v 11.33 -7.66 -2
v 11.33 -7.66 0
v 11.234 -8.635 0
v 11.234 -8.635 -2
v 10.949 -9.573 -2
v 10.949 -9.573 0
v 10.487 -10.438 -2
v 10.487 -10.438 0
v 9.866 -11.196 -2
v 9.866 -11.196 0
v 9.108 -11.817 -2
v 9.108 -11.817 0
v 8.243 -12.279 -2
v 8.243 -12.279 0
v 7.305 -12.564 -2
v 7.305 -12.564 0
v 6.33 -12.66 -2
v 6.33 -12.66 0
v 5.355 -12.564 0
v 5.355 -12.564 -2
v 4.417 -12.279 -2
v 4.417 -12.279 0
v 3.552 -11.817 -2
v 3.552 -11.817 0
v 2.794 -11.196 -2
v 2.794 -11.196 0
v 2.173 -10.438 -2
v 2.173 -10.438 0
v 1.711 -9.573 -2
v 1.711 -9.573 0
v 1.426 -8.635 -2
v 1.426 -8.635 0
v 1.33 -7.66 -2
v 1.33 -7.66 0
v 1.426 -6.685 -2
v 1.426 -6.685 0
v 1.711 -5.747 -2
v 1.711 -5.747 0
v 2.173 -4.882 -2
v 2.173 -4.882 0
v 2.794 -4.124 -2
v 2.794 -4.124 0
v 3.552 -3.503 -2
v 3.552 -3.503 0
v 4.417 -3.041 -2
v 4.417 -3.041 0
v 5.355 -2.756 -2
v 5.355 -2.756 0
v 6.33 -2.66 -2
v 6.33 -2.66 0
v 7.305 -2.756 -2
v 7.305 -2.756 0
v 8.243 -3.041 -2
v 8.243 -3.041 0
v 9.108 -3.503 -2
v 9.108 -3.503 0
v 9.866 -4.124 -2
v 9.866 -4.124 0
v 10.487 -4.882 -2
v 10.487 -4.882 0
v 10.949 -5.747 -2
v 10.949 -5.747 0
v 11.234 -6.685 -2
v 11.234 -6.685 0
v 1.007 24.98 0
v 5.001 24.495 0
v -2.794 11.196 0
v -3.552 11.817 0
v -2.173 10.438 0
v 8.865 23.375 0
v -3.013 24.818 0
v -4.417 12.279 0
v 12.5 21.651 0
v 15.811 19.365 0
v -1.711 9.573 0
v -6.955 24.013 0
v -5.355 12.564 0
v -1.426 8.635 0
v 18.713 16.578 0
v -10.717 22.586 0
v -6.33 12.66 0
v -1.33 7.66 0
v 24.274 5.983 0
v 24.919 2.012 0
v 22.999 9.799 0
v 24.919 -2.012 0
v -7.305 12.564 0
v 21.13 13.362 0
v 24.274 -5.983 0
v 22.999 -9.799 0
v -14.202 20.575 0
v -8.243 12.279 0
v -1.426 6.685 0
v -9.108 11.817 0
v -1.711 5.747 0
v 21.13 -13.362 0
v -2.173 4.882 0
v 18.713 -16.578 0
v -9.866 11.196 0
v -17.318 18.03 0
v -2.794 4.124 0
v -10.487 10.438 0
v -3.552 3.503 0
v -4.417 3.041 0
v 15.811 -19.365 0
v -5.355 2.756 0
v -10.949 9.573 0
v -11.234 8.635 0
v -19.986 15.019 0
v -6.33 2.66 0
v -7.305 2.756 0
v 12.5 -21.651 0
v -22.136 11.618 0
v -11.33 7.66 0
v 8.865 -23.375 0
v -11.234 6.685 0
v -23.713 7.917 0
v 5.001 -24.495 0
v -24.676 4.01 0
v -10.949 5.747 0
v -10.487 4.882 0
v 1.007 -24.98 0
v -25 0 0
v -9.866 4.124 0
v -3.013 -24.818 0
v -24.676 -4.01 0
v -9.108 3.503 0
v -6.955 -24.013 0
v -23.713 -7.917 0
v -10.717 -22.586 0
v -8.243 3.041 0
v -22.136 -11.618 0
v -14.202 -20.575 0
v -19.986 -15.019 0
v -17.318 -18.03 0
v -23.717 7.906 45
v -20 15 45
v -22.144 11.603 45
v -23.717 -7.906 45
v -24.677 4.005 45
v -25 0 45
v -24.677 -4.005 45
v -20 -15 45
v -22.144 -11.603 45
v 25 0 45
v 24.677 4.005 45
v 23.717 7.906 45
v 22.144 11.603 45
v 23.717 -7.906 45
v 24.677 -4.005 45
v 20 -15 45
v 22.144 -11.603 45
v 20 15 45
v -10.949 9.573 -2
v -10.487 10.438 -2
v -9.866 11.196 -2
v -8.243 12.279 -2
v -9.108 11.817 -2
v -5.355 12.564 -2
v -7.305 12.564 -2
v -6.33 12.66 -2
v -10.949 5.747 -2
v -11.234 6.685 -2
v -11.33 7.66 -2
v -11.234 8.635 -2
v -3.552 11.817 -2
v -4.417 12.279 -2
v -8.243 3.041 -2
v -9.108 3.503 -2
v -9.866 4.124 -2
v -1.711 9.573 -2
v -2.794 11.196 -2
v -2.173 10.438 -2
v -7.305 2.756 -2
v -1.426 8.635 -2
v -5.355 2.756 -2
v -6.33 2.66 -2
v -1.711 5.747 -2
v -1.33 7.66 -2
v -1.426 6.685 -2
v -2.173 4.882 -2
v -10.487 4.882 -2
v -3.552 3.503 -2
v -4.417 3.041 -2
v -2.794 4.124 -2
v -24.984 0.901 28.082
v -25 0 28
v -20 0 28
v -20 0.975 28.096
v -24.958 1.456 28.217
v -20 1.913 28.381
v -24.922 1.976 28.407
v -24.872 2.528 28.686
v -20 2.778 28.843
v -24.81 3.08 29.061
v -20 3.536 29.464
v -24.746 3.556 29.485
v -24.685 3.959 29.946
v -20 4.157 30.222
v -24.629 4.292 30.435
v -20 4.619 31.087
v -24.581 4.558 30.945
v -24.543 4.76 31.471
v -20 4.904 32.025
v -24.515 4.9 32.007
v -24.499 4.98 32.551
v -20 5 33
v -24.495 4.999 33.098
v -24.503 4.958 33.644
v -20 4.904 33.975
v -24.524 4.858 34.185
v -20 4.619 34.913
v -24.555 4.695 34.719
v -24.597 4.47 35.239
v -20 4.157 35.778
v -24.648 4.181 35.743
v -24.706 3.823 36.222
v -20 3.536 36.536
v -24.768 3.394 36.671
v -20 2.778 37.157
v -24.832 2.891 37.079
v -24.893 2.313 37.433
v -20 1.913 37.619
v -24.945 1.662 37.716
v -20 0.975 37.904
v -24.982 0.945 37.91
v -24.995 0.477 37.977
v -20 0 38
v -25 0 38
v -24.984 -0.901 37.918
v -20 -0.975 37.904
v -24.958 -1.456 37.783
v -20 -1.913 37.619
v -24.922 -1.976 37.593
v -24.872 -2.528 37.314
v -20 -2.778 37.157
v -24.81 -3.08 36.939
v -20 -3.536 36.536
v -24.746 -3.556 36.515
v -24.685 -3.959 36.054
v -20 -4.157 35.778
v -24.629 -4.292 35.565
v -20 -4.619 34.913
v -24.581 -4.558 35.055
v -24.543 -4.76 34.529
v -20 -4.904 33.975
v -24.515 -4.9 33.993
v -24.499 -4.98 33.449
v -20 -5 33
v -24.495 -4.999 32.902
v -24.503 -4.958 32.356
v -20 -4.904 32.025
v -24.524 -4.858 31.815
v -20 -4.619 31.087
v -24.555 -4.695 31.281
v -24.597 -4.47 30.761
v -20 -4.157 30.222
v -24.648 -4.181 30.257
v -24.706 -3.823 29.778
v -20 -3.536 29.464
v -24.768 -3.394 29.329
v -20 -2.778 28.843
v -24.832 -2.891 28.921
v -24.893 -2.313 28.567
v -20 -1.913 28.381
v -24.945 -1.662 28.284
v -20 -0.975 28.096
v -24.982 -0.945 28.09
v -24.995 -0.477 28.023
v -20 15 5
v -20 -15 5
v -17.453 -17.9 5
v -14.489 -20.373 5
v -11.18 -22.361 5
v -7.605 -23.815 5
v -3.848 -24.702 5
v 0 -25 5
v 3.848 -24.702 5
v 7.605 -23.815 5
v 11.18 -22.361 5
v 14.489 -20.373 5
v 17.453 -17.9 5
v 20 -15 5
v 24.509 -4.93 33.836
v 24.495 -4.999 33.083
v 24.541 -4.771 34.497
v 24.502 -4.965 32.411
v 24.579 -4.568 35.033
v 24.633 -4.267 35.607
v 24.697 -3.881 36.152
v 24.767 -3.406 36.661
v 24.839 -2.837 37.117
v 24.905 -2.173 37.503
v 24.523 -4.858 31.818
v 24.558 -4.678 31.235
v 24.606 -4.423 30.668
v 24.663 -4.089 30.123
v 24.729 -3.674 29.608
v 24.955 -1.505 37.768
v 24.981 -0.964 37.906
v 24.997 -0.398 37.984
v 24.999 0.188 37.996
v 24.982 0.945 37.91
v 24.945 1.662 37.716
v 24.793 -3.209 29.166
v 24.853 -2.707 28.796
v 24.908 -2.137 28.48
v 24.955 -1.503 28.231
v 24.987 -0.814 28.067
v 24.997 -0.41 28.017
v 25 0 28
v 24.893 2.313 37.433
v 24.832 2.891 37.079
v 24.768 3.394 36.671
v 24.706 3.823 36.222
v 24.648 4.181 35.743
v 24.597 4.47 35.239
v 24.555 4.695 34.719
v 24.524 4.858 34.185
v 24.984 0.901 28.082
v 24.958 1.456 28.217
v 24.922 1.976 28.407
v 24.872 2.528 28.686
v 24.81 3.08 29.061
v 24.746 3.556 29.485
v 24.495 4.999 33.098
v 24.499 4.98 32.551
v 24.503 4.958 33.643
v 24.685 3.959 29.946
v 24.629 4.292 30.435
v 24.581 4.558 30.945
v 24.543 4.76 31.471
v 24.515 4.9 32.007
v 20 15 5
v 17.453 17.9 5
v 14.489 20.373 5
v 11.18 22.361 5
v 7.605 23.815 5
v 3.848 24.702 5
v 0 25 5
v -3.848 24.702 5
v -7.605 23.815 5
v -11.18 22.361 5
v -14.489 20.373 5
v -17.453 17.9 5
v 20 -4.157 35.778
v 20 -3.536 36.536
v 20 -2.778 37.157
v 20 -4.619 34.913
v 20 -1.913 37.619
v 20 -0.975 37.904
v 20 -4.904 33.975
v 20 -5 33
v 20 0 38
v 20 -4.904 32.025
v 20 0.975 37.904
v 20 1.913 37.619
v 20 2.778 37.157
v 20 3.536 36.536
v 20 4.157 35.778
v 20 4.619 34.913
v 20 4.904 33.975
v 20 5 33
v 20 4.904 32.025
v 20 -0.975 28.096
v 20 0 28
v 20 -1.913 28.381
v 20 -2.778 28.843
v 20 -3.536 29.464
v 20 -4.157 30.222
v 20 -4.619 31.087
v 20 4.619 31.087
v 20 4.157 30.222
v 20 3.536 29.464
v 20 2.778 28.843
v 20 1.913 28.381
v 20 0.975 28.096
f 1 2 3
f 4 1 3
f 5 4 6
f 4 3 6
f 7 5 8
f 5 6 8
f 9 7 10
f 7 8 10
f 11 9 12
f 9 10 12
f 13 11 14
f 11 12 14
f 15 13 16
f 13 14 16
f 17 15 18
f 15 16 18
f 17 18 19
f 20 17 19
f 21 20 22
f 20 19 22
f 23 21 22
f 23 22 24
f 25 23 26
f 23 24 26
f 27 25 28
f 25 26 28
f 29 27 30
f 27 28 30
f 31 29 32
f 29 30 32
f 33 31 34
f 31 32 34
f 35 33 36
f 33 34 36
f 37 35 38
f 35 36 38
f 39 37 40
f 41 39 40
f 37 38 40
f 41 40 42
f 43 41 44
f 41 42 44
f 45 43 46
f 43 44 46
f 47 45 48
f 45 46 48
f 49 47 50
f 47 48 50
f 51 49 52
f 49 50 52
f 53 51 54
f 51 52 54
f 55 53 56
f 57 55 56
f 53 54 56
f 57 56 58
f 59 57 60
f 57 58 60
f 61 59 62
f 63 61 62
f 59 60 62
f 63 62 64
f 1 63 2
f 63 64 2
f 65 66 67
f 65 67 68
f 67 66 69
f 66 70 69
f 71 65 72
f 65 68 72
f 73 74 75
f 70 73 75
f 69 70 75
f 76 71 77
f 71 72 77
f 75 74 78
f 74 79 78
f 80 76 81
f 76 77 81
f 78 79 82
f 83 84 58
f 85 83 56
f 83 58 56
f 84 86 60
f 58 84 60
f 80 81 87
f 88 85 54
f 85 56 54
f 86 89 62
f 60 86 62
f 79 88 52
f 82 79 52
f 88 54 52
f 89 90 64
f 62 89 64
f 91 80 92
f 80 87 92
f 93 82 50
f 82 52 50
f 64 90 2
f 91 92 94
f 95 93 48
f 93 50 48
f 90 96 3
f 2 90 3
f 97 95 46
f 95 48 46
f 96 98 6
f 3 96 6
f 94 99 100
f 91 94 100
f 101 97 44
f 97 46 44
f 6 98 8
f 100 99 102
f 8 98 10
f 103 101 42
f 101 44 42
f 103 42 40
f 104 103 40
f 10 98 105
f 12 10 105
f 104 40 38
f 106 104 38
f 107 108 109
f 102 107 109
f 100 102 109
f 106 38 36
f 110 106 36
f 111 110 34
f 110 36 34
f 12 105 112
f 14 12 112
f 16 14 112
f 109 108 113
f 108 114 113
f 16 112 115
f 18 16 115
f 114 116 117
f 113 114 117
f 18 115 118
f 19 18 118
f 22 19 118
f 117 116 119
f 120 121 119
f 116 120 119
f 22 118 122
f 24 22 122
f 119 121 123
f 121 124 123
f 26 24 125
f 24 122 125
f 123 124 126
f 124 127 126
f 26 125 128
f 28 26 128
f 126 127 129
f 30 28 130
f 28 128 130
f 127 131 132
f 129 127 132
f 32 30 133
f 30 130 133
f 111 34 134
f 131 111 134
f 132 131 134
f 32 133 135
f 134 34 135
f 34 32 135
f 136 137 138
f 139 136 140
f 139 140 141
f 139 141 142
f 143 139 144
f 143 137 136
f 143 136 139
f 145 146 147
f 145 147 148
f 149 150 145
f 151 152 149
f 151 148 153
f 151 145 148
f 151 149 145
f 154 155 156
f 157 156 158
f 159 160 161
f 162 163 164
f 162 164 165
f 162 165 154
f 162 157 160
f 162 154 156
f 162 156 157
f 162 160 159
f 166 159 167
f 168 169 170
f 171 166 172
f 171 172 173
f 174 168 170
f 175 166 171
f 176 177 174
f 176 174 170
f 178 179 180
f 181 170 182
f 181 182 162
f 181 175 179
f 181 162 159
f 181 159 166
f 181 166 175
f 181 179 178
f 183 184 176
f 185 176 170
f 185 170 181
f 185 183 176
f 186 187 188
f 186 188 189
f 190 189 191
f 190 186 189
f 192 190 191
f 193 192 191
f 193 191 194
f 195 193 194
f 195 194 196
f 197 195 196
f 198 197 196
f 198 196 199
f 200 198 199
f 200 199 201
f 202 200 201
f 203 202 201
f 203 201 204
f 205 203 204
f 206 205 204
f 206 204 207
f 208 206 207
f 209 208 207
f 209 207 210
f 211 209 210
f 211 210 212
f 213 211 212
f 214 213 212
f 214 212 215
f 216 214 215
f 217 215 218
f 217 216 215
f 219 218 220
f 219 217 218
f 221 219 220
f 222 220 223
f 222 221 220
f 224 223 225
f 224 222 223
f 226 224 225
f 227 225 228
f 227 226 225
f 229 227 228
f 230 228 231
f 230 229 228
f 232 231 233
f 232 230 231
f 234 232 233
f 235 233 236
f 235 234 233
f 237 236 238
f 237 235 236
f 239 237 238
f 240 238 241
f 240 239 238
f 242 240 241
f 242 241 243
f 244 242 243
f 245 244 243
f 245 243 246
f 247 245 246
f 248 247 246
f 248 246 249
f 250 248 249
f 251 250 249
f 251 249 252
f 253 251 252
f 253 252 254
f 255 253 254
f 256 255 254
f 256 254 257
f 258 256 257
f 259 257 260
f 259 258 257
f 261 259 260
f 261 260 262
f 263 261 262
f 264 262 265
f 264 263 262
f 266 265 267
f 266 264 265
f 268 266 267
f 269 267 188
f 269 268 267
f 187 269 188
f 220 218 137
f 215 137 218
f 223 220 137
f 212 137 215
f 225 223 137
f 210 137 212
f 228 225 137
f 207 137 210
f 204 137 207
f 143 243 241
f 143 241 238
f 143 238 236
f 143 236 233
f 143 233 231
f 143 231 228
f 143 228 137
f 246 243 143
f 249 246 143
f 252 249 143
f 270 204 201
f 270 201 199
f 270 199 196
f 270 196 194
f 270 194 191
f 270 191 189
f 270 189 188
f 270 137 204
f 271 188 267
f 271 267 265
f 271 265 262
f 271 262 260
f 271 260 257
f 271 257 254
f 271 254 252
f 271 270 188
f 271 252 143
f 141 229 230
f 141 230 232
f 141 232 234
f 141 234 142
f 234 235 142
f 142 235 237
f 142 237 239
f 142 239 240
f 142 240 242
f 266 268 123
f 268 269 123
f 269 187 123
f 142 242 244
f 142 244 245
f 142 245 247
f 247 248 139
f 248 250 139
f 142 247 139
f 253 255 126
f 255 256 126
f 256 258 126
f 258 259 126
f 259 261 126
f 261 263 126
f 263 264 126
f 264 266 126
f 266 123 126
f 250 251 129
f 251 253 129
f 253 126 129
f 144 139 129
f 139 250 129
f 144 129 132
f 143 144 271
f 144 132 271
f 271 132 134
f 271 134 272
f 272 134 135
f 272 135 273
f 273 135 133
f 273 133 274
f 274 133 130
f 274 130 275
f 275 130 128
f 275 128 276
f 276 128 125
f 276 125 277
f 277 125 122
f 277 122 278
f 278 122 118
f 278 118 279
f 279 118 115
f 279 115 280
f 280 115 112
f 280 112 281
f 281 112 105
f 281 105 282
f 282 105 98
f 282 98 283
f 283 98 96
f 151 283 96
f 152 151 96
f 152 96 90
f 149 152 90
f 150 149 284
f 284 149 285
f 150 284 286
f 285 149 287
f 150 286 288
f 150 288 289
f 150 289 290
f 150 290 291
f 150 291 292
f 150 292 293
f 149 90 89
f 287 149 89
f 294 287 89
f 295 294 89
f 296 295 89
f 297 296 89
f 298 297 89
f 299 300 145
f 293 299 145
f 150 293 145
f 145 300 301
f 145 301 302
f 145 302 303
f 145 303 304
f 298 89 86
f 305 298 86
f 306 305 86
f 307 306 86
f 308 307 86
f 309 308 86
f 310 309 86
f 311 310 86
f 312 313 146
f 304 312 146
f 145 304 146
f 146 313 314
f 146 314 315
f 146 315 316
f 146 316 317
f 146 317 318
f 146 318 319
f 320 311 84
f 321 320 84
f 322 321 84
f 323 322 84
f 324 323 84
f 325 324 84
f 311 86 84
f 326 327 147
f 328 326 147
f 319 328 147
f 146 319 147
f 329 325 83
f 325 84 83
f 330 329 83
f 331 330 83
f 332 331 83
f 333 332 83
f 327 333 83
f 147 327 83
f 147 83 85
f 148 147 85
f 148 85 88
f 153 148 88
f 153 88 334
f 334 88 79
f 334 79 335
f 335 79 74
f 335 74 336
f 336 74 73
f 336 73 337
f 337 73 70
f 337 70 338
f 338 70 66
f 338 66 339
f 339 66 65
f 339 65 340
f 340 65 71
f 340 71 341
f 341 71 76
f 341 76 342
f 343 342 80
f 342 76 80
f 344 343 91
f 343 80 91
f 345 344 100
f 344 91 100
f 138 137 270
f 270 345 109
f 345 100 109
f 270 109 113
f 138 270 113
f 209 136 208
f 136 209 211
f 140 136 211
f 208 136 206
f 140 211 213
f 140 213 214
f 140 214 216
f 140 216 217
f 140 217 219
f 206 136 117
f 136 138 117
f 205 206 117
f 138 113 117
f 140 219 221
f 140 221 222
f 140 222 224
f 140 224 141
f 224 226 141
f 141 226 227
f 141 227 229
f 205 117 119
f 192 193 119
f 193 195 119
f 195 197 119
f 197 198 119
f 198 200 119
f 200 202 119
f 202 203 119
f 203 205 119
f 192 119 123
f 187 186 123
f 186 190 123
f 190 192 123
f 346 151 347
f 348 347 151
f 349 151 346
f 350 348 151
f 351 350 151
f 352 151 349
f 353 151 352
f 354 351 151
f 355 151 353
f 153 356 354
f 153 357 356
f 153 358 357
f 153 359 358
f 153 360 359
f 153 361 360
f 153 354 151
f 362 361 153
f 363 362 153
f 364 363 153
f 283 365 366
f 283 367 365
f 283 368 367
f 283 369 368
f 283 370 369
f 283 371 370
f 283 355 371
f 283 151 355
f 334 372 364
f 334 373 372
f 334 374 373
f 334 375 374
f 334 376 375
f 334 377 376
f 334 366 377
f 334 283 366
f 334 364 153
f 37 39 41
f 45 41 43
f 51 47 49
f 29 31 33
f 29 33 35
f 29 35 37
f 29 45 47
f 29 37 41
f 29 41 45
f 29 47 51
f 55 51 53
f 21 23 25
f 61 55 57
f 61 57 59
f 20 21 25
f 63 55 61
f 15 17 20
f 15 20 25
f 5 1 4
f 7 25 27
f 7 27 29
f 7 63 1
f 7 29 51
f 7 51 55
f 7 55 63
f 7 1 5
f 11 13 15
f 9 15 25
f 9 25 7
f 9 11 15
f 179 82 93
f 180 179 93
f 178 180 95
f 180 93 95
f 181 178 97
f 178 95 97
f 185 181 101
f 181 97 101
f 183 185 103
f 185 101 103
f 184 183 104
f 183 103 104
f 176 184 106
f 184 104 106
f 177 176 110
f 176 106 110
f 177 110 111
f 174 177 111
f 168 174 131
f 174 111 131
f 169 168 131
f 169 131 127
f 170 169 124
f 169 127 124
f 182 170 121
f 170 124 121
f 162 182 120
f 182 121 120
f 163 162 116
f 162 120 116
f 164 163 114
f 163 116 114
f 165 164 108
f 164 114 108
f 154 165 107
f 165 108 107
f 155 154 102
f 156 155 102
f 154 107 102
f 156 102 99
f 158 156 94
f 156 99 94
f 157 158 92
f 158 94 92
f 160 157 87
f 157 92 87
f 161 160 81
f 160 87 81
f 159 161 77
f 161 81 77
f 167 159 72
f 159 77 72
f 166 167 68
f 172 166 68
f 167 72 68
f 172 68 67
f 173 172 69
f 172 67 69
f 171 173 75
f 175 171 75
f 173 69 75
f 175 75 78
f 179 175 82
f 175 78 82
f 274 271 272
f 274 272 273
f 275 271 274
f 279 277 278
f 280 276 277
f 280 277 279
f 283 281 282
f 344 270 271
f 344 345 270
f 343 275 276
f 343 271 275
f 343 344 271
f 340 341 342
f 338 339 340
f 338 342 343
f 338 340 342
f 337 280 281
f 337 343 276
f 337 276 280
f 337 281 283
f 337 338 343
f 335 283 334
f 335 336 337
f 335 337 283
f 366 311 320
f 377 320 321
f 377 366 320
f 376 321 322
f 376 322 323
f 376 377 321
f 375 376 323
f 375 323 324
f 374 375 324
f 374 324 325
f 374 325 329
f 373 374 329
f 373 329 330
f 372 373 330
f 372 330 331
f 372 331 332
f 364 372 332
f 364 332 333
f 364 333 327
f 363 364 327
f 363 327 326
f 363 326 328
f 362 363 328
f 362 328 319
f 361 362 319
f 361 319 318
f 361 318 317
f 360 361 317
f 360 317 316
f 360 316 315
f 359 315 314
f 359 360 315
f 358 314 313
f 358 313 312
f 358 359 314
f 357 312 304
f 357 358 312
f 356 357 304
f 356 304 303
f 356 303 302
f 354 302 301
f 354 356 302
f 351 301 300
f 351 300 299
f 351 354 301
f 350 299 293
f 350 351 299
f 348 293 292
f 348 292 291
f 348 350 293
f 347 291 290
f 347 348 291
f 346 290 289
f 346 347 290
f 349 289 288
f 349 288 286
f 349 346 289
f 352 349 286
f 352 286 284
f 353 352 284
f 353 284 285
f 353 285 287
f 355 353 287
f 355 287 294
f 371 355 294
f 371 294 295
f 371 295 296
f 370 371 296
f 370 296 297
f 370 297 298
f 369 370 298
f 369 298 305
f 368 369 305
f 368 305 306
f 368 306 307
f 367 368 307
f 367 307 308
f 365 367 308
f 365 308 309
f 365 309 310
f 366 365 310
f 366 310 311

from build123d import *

# Parameters (mm, degrees)
SKETCH1_R               = 25
BOSS_EXTRUDE1_DEPTH     = 45
CUT_EXTRUDE1_START      = -40
CUT_EXTRUDE1_DEPTH      = 40
SKETCH3_R               = 5
BOSS_EXTRUDE2_DEPTH     = 2
CUT_EXTRUDE2_DEPTH      = 69.373971656
CUT_EXTRUDE2_DEPTH_BACK = 69.373971656
SKETCH4_R               = 5


with BuildPart() as part:
    # Sketch1 → Boss-Extrude1 (new body)
    with BuildSketch(Plane.XY):
        with Locations(Location((0, 0, 0), (0, 0, 180))):
            Circle(SKETCH1_R)
    extrude(amount=BOSS_EXTRUDE1_DEPTH)

    # Sketch2 → Cut-Extrude1 (cut)
    with BuildSketch(Plane.XY.offset(45).offset(CUT_EXTRUDE1_START)):
        with BuildLine():
            Line((-20, 15), (-20, -15))
            ThreePointArc((-20, -15), (0, -25), (20, -15))
            Line((20, -15), (20, 15))
            ThreePointArc((20, 15), (0, 25), (-20, 15))
        make_face()
    extrude(amount=CUT_EXTRUDE1_DEPTH, mode=Mode.SUBTRACT)

    # Sketch3 → Boss-Extrude2 (add)
    with BuildSketch(Plane(origin=(0, 0, 0), x_dir=(-1, 0, 0), z_dir=(0, 0, -1))):
        with Locations(Location((6.33, 7.66, 0), (0, 0, 180))):
            Circle(SKETCH3_R)
        with Locations(Location((-6.33, -7.66, 0), (0, 0, 180))):
            Circle(SKETCH3_R)
    extrude(amount=BOSS_EXTRUDE2_DEPTH)

    # Sketch4 → Cut-Extrude2 (cut, two sides: drawn at the far end of the back side and taken through both)
    with BuildSketch(Plane(origin=(-20, 0, 0), x_dir=(0, 0, -1), z_dir=(1, 0, 0)).offset(-CUT_EXTRUDE2_DEPTH_BACK)):
        with Locations((-33, 0)):
            Circle(SKETCH4_R)
    extrude(amount=CUT_EXTRUDE2_DEPTH + CUT_EXTRUDE2_DEPTH_BACK, mode=Mode.SUBTRACT)


solid = part.part
